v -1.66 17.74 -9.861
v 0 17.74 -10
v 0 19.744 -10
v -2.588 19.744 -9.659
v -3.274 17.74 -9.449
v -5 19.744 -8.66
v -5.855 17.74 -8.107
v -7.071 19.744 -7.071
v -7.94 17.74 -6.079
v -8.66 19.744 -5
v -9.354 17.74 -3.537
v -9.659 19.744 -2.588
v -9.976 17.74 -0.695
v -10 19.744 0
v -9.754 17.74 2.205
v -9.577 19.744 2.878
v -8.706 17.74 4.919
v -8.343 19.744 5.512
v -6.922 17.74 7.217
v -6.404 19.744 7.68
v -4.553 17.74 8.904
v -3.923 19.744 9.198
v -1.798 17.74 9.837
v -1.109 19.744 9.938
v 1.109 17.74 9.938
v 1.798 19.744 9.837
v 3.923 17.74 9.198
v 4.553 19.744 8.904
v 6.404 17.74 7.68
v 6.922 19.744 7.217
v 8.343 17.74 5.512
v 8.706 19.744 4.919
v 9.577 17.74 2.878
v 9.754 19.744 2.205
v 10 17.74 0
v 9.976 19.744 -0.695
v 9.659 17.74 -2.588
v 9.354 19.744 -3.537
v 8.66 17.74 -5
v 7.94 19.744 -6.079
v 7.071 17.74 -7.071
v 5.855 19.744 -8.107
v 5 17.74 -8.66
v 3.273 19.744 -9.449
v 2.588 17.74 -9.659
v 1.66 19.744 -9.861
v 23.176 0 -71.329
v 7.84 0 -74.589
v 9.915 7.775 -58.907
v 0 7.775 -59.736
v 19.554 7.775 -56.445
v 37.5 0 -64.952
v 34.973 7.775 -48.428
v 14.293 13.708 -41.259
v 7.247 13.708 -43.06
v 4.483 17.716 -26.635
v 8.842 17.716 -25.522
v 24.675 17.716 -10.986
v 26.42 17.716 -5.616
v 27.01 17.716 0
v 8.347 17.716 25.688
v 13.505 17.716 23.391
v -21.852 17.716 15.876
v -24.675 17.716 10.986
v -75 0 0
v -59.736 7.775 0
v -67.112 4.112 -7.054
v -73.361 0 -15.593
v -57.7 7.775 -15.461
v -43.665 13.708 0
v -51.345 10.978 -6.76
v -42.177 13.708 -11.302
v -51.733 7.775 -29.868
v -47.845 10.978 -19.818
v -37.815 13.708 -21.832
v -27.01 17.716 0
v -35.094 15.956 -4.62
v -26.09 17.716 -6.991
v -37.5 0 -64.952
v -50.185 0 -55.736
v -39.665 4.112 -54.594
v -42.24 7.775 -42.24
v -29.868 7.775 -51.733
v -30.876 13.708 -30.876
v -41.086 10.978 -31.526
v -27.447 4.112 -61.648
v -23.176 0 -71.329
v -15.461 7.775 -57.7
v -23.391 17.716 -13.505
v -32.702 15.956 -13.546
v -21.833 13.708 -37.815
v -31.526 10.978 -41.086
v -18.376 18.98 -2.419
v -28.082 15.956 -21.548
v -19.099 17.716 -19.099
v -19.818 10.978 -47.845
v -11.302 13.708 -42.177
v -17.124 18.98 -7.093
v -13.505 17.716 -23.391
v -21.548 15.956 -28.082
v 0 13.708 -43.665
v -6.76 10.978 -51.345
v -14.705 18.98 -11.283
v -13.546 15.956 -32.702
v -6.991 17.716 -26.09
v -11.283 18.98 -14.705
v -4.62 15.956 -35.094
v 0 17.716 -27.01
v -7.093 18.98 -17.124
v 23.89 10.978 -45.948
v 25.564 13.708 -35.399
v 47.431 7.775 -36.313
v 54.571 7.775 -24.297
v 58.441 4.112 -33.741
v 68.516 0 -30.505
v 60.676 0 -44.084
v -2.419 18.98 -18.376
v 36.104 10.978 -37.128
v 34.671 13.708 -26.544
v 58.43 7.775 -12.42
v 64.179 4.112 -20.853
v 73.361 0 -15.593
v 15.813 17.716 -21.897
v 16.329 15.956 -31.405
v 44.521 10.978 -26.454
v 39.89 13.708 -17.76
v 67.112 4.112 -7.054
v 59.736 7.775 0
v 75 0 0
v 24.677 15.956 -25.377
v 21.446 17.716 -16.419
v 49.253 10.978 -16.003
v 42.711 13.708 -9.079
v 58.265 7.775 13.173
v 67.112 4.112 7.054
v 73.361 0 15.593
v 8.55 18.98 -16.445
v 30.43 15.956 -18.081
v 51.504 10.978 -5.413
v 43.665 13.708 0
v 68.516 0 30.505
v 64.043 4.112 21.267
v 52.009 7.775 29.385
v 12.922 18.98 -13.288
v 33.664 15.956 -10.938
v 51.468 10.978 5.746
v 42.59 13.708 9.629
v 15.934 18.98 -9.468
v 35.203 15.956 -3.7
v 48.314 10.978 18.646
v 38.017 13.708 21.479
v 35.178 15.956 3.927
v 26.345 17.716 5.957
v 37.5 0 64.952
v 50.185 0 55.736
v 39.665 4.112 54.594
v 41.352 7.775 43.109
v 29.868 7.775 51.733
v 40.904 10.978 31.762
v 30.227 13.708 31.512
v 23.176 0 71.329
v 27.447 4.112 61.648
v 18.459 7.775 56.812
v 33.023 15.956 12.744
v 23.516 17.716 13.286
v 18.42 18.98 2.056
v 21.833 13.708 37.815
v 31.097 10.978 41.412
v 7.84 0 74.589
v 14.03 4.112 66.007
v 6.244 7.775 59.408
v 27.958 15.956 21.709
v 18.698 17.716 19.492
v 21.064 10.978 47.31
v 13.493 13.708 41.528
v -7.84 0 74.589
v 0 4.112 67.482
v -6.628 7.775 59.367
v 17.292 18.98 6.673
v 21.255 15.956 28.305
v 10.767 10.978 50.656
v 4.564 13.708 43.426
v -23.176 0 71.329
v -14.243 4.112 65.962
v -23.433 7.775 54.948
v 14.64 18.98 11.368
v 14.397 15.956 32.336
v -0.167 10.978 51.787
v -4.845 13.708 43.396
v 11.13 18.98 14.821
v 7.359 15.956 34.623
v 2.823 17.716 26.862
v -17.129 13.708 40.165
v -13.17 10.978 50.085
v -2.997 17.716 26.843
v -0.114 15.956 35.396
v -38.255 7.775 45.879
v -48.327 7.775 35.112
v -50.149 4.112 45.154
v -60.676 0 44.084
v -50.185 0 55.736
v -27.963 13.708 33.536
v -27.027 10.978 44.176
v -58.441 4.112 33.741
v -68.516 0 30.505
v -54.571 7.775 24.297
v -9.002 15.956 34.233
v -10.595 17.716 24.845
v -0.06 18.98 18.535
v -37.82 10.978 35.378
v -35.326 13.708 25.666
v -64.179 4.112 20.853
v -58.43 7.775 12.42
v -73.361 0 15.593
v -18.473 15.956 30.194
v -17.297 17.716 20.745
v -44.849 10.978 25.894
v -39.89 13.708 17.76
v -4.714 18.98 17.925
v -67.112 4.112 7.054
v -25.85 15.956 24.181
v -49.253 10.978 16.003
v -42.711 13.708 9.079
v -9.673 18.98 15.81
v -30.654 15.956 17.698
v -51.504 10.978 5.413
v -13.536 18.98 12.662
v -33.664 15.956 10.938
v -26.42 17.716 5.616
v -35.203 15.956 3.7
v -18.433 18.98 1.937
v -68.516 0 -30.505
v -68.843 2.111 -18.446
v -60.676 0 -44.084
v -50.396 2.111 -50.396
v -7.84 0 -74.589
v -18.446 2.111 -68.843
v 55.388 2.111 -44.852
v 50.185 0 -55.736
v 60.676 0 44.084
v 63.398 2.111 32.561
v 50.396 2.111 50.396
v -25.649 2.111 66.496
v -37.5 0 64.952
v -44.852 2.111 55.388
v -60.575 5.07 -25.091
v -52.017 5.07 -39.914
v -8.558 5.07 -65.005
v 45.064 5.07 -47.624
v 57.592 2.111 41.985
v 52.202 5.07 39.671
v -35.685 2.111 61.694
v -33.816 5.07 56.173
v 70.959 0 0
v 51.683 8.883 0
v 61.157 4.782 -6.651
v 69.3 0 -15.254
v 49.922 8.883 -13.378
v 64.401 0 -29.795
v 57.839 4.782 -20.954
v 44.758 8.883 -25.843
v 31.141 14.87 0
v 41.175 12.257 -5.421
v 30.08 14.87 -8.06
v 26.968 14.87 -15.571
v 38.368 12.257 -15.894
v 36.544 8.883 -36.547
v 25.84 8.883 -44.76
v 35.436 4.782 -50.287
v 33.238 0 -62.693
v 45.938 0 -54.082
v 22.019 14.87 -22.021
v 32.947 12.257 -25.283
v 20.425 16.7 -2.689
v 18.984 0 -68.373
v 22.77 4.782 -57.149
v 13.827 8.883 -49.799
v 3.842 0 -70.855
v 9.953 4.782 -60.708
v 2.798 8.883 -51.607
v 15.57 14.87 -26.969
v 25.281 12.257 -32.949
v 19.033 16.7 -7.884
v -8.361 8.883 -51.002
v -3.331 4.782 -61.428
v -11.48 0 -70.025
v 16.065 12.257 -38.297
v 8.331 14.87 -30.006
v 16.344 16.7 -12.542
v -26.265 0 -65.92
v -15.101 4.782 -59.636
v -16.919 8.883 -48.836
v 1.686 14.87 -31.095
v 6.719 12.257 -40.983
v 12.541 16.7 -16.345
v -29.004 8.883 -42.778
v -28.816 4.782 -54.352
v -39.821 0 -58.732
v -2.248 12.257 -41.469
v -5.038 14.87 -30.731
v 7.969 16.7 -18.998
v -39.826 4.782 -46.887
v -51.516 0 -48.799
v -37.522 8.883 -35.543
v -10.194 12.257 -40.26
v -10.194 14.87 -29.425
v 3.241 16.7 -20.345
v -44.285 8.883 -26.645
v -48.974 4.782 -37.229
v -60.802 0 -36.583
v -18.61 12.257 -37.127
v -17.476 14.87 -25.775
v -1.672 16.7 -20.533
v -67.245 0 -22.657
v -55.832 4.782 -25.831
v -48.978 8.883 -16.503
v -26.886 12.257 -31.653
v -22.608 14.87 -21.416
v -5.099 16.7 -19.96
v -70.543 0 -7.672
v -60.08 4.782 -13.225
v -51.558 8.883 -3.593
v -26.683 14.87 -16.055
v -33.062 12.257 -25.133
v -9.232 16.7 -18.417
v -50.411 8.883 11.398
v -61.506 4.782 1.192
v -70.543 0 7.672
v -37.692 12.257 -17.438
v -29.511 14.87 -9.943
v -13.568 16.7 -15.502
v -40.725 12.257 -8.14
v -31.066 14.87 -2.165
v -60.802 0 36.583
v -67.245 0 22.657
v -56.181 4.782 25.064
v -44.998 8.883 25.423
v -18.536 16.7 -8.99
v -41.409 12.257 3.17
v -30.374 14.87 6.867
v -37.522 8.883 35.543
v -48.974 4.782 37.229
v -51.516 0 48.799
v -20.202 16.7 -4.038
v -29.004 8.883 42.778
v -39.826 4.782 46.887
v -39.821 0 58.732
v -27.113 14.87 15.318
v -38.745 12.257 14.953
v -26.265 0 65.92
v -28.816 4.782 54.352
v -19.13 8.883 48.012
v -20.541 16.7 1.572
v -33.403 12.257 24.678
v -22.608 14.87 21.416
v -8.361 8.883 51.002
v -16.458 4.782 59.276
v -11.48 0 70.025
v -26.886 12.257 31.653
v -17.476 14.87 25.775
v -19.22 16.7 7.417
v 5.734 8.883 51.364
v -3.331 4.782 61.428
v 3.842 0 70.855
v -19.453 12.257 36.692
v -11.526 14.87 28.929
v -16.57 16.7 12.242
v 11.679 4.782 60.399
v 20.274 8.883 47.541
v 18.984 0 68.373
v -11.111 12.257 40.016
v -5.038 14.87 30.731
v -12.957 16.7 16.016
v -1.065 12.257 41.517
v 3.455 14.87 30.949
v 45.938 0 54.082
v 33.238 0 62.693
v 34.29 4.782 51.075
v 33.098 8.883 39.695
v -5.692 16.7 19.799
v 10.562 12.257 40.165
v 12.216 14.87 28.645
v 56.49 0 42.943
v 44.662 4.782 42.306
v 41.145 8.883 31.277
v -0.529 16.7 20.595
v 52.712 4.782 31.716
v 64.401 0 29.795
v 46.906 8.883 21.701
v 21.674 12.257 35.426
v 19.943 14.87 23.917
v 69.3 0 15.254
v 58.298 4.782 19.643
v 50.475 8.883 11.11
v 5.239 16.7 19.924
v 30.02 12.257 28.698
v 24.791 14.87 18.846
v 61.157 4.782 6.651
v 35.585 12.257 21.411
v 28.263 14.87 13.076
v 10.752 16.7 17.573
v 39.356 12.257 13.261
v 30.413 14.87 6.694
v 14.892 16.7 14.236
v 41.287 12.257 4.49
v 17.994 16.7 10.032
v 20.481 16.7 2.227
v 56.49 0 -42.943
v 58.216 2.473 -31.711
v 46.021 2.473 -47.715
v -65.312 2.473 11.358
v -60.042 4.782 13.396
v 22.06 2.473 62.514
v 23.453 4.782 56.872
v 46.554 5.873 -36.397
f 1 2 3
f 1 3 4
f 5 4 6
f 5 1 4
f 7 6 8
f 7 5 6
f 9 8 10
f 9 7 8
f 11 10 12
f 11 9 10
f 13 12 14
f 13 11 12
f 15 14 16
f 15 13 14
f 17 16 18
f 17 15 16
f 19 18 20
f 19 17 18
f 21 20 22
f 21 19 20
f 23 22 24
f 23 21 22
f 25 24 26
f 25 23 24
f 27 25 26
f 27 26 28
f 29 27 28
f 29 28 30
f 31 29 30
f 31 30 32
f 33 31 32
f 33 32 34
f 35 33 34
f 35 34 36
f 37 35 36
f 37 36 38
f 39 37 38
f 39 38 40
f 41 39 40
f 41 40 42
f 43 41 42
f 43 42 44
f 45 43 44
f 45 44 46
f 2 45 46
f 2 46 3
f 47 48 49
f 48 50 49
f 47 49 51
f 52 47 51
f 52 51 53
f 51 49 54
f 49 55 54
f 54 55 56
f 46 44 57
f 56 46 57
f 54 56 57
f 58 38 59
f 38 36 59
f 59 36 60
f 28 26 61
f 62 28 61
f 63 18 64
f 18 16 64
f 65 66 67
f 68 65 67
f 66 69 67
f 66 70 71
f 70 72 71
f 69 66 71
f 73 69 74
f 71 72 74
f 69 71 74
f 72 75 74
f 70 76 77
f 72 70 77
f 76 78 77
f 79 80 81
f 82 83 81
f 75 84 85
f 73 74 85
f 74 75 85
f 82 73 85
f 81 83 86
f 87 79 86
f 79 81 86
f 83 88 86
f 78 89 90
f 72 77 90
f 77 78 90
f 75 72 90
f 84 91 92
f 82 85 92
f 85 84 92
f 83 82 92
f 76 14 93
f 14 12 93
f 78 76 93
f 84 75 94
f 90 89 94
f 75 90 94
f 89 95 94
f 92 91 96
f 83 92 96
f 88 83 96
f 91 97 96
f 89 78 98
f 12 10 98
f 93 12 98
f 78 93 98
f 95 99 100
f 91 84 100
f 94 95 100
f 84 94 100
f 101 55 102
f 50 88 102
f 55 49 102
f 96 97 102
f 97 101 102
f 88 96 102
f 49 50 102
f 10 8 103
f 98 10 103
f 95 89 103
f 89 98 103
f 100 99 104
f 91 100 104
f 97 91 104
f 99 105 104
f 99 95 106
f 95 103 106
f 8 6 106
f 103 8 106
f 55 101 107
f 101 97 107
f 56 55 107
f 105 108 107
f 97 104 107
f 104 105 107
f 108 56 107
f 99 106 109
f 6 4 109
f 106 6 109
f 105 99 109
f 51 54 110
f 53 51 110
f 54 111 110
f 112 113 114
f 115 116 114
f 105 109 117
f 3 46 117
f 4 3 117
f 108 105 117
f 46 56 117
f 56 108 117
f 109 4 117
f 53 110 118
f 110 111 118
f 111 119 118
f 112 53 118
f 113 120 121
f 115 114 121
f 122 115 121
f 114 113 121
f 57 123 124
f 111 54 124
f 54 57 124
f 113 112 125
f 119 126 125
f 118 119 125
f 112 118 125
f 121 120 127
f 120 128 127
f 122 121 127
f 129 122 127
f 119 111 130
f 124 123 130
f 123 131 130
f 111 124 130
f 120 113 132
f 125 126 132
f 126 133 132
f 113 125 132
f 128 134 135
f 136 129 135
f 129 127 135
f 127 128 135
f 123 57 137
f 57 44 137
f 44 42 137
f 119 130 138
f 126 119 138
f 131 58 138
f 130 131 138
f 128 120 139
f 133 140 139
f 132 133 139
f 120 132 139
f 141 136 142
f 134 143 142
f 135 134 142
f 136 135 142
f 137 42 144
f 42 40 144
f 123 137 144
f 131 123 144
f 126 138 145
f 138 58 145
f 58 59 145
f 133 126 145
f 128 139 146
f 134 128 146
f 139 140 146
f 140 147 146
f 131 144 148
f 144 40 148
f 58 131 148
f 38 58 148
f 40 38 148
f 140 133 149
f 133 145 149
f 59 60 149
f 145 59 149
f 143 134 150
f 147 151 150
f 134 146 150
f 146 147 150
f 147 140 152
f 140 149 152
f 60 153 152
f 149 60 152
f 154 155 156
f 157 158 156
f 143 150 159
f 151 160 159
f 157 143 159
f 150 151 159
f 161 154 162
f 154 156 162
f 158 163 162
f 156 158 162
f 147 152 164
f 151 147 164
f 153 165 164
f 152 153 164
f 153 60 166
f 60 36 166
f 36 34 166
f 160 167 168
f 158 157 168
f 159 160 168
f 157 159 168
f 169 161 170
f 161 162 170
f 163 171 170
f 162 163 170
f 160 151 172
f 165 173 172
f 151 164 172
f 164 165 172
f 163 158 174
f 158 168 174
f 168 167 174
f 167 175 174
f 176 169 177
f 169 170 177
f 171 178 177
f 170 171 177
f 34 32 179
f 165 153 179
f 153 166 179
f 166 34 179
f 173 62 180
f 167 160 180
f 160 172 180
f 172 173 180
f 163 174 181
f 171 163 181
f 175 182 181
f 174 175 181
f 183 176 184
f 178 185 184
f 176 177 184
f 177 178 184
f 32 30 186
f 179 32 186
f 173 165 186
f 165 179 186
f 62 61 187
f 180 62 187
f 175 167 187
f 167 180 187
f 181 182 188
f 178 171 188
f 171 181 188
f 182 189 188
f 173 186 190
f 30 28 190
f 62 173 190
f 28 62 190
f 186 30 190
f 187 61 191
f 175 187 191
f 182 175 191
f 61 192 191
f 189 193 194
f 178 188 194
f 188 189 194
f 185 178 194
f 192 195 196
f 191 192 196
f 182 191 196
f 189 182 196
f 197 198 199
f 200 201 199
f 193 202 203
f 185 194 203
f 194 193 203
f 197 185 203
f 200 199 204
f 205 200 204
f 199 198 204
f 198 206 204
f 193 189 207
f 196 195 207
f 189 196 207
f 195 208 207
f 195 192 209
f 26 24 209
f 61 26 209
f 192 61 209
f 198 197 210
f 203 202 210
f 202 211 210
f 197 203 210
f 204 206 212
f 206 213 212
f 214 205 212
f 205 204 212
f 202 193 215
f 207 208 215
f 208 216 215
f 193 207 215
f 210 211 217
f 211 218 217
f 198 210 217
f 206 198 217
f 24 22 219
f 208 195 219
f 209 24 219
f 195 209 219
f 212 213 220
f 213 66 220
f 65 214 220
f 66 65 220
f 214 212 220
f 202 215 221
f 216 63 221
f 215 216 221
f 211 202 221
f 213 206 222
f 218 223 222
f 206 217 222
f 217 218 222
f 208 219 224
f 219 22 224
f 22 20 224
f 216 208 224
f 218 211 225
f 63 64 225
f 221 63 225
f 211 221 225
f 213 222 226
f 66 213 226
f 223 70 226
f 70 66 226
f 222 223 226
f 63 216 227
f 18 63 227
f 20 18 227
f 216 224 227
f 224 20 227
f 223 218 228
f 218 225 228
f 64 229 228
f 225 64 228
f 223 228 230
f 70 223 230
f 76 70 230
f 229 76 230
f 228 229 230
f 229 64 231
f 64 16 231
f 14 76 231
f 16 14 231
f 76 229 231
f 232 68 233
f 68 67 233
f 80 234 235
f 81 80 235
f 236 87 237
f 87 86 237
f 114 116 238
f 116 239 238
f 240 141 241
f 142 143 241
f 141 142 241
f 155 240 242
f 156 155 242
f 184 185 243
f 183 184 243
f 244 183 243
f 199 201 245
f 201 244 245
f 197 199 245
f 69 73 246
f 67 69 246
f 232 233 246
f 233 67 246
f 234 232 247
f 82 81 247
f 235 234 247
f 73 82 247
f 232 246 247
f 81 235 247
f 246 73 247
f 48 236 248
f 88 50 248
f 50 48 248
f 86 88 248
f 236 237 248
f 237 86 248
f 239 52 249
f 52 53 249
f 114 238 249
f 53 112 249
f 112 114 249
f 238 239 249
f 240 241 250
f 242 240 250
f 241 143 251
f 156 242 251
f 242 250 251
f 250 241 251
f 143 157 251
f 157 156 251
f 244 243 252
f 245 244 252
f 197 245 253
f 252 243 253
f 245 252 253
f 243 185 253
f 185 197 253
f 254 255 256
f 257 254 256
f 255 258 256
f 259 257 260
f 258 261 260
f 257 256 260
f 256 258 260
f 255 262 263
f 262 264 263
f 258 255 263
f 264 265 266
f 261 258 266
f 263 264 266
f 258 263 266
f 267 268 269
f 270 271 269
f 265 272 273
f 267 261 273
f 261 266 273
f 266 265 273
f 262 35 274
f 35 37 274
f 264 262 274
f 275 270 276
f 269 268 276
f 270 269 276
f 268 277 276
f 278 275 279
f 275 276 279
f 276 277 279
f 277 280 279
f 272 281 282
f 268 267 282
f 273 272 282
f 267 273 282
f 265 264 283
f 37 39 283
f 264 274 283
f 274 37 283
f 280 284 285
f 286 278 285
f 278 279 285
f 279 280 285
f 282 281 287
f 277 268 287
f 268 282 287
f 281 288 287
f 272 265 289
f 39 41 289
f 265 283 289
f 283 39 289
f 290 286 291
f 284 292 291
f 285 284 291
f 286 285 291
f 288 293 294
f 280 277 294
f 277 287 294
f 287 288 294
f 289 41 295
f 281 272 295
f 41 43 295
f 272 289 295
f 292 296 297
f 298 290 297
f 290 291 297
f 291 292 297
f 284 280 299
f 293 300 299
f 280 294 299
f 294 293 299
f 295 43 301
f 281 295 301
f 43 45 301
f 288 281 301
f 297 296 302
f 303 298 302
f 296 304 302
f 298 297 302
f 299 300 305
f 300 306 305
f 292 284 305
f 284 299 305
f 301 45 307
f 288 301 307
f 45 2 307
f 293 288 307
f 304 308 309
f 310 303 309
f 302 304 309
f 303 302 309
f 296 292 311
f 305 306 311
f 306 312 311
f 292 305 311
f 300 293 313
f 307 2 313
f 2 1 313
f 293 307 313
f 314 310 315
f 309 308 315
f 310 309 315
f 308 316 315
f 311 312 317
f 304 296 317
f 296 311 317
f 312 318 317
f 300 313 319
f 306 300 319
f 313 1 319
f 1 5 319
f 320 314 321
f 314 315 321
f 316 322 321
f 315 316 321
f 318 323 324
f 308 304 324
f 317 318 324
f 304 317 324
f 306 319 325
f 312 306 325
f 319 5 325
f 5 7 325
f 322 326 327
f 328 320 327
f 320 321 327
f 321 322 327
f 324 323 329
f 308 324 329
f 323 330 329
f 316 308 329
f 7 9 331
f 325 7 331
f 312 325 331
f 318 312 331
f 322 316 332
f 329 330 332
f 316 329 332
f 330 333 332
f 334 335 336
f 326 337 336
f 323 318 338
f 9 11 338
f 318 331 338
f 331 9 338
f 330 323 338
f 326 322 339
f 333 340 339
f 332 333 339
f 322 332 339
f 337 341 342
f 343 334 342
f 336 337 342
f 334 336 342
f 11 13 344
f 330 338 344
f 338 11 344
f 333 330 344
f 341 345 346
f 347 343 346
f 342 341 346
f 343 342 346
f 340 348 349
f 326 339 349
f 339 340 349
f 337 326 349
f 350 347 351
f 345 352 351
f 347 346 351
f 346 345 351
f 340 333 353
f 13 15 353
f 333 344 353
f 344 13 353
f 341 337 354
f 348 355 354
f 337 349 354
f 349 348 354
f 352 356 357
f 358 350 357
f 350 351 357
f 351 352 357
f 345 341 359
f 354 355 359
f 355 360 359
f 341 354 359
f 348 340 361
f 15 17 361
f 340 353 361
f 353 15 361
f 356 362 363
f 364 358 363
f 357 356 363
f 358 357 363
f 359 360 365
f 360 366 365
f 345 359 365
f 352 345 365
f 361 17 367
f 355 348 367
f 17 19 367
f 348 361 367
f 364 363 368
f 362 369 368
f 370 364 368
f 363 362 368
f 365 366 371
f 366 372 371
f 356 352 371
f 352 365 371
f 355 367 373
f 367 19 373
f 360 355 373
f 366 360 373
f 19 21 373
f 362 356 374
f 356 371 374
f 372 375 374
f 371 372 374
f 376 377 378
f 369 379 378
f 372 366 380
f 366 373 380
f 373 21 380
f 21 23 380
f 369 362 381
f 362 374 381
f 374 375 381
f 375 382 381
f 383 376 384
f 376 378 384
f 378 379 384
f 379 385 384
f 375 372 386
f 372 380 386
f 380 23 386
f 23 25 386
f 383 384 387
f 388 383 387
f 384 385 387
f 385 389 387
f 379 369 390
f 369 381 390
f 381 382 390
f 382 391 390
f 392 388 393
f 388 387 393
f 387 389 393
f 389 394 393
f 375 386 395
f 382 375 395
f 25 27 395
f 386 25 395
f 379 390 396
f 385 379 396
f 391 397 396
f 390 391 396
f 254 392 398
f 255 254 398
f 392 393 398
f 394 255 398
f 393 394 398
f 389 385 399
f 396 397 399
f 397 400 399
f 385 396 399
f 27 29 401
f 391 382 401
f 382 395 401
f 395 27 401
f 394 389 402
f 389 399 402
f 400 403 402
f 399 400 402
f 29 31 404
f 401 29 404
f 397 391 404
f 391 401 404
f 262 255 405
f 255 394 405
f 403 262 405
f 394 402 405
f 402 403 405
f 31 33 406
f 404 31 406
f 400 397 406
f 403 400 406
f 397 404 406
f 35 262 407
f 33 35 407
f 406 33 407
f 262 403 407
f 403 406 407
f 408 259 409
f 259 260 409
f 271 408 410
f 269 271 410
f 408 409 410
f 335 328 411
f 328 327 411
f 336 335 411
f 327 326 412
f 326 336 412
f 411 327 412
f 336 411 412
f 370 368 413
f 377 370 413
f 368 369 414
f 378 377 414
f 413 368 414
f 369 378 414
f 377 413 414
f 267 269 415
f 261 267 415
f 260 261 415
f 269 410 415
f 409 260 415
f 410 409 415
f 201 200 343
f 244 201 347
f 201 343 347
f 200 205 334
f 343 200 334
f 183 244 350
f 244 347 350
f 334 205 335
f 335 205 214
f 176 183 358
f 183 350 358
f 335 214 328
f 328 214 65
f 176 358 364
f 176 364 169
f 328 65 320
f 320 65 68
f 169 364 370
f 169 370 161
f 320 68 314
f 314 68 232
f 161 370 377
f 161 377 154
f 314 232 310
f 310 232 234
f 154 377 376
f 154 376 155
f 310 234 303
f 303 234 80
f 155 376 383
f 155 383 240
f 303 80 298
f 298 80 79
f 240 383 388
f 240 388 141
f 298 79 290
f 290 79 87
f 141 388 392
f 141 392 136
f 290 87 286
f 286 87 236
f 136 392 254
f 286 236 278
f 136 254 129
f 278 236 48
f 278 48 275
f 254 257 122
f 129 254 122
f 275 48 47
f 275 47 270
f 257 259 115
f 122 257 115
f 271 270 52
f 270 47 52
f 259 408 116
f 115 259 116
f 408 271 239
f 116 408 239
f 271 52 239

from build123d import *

# Parameters (mm, degrees)
SKETCH4_R          = 10
CUT_EXTRUDE1_DEPTH = 22


# Read off the part's stored shape, not the designer's step: Shell4
with BuildPart() as part:
    # Sketch2 → Revolve3 (revolve)
    with BuildSketch(Plane.XY):
        with BuildLine():
            ThreePointArc((-75, 0), (-38.854521396, 15.079455235), (0, 20))
            Line((0, 20), (0, 0))
            Line((0, 0), (-75, 0))
        make_face()
    revolve(axis=Axis((0, 20, 0), (0, -1, 0)))

    # Shell4 outline → Shell4 (revolve, cut)
    with BuildSketch(Plane.XY):
        with BuildLine():
            Line((0, 0), (70.959299581, 0))
            add(Edge.make_bspline(
                [(70.959299581, 0), (58.371091625, 6.969352493), (44.697655968, 12.48291706), (30.310219449, 16.202186231), (15.668630532, 18.005474405), (1.010939764, 18.005474483), (0.758094755, 18.004918806), (0.505321529, 18.00380806), (0.252622481, 18.002142877), (0, 17.999923905)],
                knots=[1.06516175, 1.06516175, 1.06516175, 1.06516175, 1.06516175, 1.06516175, 1.570703705, 1.570703705, 1.570703705, 1.570703705, 1.579579846, 1.579579846, 1.579579846, 1.579579846, 1.579579846, 1.579579846], degree=5, weights=[1, 1, 0.999596269, 0.999595367, 1, 1, 1, 1, 1, 1]))
            Line((0, 17.999923905), (0, 0))
        make_face()
    revolve(axis=Axis((0, 0, 0), (0, 1, 0)), mode=Mode.SUBTRACT)

    # Sketch4 → Cut-Extrude1 (cut)
    with BuildSketch(Plane(origin=(0, 0, 0), x_dir=(1, 0, 0), z_dir=(0, 1, 0))):
        with Locations(Location((0, 0, 0), (0, 0, 90))):
            Circle(SKETCH4_R)
    extrude(amount=CUT_EXTRUDE1_DEPTH, mode=Mode.SUBTRACT)


solid = part.part
